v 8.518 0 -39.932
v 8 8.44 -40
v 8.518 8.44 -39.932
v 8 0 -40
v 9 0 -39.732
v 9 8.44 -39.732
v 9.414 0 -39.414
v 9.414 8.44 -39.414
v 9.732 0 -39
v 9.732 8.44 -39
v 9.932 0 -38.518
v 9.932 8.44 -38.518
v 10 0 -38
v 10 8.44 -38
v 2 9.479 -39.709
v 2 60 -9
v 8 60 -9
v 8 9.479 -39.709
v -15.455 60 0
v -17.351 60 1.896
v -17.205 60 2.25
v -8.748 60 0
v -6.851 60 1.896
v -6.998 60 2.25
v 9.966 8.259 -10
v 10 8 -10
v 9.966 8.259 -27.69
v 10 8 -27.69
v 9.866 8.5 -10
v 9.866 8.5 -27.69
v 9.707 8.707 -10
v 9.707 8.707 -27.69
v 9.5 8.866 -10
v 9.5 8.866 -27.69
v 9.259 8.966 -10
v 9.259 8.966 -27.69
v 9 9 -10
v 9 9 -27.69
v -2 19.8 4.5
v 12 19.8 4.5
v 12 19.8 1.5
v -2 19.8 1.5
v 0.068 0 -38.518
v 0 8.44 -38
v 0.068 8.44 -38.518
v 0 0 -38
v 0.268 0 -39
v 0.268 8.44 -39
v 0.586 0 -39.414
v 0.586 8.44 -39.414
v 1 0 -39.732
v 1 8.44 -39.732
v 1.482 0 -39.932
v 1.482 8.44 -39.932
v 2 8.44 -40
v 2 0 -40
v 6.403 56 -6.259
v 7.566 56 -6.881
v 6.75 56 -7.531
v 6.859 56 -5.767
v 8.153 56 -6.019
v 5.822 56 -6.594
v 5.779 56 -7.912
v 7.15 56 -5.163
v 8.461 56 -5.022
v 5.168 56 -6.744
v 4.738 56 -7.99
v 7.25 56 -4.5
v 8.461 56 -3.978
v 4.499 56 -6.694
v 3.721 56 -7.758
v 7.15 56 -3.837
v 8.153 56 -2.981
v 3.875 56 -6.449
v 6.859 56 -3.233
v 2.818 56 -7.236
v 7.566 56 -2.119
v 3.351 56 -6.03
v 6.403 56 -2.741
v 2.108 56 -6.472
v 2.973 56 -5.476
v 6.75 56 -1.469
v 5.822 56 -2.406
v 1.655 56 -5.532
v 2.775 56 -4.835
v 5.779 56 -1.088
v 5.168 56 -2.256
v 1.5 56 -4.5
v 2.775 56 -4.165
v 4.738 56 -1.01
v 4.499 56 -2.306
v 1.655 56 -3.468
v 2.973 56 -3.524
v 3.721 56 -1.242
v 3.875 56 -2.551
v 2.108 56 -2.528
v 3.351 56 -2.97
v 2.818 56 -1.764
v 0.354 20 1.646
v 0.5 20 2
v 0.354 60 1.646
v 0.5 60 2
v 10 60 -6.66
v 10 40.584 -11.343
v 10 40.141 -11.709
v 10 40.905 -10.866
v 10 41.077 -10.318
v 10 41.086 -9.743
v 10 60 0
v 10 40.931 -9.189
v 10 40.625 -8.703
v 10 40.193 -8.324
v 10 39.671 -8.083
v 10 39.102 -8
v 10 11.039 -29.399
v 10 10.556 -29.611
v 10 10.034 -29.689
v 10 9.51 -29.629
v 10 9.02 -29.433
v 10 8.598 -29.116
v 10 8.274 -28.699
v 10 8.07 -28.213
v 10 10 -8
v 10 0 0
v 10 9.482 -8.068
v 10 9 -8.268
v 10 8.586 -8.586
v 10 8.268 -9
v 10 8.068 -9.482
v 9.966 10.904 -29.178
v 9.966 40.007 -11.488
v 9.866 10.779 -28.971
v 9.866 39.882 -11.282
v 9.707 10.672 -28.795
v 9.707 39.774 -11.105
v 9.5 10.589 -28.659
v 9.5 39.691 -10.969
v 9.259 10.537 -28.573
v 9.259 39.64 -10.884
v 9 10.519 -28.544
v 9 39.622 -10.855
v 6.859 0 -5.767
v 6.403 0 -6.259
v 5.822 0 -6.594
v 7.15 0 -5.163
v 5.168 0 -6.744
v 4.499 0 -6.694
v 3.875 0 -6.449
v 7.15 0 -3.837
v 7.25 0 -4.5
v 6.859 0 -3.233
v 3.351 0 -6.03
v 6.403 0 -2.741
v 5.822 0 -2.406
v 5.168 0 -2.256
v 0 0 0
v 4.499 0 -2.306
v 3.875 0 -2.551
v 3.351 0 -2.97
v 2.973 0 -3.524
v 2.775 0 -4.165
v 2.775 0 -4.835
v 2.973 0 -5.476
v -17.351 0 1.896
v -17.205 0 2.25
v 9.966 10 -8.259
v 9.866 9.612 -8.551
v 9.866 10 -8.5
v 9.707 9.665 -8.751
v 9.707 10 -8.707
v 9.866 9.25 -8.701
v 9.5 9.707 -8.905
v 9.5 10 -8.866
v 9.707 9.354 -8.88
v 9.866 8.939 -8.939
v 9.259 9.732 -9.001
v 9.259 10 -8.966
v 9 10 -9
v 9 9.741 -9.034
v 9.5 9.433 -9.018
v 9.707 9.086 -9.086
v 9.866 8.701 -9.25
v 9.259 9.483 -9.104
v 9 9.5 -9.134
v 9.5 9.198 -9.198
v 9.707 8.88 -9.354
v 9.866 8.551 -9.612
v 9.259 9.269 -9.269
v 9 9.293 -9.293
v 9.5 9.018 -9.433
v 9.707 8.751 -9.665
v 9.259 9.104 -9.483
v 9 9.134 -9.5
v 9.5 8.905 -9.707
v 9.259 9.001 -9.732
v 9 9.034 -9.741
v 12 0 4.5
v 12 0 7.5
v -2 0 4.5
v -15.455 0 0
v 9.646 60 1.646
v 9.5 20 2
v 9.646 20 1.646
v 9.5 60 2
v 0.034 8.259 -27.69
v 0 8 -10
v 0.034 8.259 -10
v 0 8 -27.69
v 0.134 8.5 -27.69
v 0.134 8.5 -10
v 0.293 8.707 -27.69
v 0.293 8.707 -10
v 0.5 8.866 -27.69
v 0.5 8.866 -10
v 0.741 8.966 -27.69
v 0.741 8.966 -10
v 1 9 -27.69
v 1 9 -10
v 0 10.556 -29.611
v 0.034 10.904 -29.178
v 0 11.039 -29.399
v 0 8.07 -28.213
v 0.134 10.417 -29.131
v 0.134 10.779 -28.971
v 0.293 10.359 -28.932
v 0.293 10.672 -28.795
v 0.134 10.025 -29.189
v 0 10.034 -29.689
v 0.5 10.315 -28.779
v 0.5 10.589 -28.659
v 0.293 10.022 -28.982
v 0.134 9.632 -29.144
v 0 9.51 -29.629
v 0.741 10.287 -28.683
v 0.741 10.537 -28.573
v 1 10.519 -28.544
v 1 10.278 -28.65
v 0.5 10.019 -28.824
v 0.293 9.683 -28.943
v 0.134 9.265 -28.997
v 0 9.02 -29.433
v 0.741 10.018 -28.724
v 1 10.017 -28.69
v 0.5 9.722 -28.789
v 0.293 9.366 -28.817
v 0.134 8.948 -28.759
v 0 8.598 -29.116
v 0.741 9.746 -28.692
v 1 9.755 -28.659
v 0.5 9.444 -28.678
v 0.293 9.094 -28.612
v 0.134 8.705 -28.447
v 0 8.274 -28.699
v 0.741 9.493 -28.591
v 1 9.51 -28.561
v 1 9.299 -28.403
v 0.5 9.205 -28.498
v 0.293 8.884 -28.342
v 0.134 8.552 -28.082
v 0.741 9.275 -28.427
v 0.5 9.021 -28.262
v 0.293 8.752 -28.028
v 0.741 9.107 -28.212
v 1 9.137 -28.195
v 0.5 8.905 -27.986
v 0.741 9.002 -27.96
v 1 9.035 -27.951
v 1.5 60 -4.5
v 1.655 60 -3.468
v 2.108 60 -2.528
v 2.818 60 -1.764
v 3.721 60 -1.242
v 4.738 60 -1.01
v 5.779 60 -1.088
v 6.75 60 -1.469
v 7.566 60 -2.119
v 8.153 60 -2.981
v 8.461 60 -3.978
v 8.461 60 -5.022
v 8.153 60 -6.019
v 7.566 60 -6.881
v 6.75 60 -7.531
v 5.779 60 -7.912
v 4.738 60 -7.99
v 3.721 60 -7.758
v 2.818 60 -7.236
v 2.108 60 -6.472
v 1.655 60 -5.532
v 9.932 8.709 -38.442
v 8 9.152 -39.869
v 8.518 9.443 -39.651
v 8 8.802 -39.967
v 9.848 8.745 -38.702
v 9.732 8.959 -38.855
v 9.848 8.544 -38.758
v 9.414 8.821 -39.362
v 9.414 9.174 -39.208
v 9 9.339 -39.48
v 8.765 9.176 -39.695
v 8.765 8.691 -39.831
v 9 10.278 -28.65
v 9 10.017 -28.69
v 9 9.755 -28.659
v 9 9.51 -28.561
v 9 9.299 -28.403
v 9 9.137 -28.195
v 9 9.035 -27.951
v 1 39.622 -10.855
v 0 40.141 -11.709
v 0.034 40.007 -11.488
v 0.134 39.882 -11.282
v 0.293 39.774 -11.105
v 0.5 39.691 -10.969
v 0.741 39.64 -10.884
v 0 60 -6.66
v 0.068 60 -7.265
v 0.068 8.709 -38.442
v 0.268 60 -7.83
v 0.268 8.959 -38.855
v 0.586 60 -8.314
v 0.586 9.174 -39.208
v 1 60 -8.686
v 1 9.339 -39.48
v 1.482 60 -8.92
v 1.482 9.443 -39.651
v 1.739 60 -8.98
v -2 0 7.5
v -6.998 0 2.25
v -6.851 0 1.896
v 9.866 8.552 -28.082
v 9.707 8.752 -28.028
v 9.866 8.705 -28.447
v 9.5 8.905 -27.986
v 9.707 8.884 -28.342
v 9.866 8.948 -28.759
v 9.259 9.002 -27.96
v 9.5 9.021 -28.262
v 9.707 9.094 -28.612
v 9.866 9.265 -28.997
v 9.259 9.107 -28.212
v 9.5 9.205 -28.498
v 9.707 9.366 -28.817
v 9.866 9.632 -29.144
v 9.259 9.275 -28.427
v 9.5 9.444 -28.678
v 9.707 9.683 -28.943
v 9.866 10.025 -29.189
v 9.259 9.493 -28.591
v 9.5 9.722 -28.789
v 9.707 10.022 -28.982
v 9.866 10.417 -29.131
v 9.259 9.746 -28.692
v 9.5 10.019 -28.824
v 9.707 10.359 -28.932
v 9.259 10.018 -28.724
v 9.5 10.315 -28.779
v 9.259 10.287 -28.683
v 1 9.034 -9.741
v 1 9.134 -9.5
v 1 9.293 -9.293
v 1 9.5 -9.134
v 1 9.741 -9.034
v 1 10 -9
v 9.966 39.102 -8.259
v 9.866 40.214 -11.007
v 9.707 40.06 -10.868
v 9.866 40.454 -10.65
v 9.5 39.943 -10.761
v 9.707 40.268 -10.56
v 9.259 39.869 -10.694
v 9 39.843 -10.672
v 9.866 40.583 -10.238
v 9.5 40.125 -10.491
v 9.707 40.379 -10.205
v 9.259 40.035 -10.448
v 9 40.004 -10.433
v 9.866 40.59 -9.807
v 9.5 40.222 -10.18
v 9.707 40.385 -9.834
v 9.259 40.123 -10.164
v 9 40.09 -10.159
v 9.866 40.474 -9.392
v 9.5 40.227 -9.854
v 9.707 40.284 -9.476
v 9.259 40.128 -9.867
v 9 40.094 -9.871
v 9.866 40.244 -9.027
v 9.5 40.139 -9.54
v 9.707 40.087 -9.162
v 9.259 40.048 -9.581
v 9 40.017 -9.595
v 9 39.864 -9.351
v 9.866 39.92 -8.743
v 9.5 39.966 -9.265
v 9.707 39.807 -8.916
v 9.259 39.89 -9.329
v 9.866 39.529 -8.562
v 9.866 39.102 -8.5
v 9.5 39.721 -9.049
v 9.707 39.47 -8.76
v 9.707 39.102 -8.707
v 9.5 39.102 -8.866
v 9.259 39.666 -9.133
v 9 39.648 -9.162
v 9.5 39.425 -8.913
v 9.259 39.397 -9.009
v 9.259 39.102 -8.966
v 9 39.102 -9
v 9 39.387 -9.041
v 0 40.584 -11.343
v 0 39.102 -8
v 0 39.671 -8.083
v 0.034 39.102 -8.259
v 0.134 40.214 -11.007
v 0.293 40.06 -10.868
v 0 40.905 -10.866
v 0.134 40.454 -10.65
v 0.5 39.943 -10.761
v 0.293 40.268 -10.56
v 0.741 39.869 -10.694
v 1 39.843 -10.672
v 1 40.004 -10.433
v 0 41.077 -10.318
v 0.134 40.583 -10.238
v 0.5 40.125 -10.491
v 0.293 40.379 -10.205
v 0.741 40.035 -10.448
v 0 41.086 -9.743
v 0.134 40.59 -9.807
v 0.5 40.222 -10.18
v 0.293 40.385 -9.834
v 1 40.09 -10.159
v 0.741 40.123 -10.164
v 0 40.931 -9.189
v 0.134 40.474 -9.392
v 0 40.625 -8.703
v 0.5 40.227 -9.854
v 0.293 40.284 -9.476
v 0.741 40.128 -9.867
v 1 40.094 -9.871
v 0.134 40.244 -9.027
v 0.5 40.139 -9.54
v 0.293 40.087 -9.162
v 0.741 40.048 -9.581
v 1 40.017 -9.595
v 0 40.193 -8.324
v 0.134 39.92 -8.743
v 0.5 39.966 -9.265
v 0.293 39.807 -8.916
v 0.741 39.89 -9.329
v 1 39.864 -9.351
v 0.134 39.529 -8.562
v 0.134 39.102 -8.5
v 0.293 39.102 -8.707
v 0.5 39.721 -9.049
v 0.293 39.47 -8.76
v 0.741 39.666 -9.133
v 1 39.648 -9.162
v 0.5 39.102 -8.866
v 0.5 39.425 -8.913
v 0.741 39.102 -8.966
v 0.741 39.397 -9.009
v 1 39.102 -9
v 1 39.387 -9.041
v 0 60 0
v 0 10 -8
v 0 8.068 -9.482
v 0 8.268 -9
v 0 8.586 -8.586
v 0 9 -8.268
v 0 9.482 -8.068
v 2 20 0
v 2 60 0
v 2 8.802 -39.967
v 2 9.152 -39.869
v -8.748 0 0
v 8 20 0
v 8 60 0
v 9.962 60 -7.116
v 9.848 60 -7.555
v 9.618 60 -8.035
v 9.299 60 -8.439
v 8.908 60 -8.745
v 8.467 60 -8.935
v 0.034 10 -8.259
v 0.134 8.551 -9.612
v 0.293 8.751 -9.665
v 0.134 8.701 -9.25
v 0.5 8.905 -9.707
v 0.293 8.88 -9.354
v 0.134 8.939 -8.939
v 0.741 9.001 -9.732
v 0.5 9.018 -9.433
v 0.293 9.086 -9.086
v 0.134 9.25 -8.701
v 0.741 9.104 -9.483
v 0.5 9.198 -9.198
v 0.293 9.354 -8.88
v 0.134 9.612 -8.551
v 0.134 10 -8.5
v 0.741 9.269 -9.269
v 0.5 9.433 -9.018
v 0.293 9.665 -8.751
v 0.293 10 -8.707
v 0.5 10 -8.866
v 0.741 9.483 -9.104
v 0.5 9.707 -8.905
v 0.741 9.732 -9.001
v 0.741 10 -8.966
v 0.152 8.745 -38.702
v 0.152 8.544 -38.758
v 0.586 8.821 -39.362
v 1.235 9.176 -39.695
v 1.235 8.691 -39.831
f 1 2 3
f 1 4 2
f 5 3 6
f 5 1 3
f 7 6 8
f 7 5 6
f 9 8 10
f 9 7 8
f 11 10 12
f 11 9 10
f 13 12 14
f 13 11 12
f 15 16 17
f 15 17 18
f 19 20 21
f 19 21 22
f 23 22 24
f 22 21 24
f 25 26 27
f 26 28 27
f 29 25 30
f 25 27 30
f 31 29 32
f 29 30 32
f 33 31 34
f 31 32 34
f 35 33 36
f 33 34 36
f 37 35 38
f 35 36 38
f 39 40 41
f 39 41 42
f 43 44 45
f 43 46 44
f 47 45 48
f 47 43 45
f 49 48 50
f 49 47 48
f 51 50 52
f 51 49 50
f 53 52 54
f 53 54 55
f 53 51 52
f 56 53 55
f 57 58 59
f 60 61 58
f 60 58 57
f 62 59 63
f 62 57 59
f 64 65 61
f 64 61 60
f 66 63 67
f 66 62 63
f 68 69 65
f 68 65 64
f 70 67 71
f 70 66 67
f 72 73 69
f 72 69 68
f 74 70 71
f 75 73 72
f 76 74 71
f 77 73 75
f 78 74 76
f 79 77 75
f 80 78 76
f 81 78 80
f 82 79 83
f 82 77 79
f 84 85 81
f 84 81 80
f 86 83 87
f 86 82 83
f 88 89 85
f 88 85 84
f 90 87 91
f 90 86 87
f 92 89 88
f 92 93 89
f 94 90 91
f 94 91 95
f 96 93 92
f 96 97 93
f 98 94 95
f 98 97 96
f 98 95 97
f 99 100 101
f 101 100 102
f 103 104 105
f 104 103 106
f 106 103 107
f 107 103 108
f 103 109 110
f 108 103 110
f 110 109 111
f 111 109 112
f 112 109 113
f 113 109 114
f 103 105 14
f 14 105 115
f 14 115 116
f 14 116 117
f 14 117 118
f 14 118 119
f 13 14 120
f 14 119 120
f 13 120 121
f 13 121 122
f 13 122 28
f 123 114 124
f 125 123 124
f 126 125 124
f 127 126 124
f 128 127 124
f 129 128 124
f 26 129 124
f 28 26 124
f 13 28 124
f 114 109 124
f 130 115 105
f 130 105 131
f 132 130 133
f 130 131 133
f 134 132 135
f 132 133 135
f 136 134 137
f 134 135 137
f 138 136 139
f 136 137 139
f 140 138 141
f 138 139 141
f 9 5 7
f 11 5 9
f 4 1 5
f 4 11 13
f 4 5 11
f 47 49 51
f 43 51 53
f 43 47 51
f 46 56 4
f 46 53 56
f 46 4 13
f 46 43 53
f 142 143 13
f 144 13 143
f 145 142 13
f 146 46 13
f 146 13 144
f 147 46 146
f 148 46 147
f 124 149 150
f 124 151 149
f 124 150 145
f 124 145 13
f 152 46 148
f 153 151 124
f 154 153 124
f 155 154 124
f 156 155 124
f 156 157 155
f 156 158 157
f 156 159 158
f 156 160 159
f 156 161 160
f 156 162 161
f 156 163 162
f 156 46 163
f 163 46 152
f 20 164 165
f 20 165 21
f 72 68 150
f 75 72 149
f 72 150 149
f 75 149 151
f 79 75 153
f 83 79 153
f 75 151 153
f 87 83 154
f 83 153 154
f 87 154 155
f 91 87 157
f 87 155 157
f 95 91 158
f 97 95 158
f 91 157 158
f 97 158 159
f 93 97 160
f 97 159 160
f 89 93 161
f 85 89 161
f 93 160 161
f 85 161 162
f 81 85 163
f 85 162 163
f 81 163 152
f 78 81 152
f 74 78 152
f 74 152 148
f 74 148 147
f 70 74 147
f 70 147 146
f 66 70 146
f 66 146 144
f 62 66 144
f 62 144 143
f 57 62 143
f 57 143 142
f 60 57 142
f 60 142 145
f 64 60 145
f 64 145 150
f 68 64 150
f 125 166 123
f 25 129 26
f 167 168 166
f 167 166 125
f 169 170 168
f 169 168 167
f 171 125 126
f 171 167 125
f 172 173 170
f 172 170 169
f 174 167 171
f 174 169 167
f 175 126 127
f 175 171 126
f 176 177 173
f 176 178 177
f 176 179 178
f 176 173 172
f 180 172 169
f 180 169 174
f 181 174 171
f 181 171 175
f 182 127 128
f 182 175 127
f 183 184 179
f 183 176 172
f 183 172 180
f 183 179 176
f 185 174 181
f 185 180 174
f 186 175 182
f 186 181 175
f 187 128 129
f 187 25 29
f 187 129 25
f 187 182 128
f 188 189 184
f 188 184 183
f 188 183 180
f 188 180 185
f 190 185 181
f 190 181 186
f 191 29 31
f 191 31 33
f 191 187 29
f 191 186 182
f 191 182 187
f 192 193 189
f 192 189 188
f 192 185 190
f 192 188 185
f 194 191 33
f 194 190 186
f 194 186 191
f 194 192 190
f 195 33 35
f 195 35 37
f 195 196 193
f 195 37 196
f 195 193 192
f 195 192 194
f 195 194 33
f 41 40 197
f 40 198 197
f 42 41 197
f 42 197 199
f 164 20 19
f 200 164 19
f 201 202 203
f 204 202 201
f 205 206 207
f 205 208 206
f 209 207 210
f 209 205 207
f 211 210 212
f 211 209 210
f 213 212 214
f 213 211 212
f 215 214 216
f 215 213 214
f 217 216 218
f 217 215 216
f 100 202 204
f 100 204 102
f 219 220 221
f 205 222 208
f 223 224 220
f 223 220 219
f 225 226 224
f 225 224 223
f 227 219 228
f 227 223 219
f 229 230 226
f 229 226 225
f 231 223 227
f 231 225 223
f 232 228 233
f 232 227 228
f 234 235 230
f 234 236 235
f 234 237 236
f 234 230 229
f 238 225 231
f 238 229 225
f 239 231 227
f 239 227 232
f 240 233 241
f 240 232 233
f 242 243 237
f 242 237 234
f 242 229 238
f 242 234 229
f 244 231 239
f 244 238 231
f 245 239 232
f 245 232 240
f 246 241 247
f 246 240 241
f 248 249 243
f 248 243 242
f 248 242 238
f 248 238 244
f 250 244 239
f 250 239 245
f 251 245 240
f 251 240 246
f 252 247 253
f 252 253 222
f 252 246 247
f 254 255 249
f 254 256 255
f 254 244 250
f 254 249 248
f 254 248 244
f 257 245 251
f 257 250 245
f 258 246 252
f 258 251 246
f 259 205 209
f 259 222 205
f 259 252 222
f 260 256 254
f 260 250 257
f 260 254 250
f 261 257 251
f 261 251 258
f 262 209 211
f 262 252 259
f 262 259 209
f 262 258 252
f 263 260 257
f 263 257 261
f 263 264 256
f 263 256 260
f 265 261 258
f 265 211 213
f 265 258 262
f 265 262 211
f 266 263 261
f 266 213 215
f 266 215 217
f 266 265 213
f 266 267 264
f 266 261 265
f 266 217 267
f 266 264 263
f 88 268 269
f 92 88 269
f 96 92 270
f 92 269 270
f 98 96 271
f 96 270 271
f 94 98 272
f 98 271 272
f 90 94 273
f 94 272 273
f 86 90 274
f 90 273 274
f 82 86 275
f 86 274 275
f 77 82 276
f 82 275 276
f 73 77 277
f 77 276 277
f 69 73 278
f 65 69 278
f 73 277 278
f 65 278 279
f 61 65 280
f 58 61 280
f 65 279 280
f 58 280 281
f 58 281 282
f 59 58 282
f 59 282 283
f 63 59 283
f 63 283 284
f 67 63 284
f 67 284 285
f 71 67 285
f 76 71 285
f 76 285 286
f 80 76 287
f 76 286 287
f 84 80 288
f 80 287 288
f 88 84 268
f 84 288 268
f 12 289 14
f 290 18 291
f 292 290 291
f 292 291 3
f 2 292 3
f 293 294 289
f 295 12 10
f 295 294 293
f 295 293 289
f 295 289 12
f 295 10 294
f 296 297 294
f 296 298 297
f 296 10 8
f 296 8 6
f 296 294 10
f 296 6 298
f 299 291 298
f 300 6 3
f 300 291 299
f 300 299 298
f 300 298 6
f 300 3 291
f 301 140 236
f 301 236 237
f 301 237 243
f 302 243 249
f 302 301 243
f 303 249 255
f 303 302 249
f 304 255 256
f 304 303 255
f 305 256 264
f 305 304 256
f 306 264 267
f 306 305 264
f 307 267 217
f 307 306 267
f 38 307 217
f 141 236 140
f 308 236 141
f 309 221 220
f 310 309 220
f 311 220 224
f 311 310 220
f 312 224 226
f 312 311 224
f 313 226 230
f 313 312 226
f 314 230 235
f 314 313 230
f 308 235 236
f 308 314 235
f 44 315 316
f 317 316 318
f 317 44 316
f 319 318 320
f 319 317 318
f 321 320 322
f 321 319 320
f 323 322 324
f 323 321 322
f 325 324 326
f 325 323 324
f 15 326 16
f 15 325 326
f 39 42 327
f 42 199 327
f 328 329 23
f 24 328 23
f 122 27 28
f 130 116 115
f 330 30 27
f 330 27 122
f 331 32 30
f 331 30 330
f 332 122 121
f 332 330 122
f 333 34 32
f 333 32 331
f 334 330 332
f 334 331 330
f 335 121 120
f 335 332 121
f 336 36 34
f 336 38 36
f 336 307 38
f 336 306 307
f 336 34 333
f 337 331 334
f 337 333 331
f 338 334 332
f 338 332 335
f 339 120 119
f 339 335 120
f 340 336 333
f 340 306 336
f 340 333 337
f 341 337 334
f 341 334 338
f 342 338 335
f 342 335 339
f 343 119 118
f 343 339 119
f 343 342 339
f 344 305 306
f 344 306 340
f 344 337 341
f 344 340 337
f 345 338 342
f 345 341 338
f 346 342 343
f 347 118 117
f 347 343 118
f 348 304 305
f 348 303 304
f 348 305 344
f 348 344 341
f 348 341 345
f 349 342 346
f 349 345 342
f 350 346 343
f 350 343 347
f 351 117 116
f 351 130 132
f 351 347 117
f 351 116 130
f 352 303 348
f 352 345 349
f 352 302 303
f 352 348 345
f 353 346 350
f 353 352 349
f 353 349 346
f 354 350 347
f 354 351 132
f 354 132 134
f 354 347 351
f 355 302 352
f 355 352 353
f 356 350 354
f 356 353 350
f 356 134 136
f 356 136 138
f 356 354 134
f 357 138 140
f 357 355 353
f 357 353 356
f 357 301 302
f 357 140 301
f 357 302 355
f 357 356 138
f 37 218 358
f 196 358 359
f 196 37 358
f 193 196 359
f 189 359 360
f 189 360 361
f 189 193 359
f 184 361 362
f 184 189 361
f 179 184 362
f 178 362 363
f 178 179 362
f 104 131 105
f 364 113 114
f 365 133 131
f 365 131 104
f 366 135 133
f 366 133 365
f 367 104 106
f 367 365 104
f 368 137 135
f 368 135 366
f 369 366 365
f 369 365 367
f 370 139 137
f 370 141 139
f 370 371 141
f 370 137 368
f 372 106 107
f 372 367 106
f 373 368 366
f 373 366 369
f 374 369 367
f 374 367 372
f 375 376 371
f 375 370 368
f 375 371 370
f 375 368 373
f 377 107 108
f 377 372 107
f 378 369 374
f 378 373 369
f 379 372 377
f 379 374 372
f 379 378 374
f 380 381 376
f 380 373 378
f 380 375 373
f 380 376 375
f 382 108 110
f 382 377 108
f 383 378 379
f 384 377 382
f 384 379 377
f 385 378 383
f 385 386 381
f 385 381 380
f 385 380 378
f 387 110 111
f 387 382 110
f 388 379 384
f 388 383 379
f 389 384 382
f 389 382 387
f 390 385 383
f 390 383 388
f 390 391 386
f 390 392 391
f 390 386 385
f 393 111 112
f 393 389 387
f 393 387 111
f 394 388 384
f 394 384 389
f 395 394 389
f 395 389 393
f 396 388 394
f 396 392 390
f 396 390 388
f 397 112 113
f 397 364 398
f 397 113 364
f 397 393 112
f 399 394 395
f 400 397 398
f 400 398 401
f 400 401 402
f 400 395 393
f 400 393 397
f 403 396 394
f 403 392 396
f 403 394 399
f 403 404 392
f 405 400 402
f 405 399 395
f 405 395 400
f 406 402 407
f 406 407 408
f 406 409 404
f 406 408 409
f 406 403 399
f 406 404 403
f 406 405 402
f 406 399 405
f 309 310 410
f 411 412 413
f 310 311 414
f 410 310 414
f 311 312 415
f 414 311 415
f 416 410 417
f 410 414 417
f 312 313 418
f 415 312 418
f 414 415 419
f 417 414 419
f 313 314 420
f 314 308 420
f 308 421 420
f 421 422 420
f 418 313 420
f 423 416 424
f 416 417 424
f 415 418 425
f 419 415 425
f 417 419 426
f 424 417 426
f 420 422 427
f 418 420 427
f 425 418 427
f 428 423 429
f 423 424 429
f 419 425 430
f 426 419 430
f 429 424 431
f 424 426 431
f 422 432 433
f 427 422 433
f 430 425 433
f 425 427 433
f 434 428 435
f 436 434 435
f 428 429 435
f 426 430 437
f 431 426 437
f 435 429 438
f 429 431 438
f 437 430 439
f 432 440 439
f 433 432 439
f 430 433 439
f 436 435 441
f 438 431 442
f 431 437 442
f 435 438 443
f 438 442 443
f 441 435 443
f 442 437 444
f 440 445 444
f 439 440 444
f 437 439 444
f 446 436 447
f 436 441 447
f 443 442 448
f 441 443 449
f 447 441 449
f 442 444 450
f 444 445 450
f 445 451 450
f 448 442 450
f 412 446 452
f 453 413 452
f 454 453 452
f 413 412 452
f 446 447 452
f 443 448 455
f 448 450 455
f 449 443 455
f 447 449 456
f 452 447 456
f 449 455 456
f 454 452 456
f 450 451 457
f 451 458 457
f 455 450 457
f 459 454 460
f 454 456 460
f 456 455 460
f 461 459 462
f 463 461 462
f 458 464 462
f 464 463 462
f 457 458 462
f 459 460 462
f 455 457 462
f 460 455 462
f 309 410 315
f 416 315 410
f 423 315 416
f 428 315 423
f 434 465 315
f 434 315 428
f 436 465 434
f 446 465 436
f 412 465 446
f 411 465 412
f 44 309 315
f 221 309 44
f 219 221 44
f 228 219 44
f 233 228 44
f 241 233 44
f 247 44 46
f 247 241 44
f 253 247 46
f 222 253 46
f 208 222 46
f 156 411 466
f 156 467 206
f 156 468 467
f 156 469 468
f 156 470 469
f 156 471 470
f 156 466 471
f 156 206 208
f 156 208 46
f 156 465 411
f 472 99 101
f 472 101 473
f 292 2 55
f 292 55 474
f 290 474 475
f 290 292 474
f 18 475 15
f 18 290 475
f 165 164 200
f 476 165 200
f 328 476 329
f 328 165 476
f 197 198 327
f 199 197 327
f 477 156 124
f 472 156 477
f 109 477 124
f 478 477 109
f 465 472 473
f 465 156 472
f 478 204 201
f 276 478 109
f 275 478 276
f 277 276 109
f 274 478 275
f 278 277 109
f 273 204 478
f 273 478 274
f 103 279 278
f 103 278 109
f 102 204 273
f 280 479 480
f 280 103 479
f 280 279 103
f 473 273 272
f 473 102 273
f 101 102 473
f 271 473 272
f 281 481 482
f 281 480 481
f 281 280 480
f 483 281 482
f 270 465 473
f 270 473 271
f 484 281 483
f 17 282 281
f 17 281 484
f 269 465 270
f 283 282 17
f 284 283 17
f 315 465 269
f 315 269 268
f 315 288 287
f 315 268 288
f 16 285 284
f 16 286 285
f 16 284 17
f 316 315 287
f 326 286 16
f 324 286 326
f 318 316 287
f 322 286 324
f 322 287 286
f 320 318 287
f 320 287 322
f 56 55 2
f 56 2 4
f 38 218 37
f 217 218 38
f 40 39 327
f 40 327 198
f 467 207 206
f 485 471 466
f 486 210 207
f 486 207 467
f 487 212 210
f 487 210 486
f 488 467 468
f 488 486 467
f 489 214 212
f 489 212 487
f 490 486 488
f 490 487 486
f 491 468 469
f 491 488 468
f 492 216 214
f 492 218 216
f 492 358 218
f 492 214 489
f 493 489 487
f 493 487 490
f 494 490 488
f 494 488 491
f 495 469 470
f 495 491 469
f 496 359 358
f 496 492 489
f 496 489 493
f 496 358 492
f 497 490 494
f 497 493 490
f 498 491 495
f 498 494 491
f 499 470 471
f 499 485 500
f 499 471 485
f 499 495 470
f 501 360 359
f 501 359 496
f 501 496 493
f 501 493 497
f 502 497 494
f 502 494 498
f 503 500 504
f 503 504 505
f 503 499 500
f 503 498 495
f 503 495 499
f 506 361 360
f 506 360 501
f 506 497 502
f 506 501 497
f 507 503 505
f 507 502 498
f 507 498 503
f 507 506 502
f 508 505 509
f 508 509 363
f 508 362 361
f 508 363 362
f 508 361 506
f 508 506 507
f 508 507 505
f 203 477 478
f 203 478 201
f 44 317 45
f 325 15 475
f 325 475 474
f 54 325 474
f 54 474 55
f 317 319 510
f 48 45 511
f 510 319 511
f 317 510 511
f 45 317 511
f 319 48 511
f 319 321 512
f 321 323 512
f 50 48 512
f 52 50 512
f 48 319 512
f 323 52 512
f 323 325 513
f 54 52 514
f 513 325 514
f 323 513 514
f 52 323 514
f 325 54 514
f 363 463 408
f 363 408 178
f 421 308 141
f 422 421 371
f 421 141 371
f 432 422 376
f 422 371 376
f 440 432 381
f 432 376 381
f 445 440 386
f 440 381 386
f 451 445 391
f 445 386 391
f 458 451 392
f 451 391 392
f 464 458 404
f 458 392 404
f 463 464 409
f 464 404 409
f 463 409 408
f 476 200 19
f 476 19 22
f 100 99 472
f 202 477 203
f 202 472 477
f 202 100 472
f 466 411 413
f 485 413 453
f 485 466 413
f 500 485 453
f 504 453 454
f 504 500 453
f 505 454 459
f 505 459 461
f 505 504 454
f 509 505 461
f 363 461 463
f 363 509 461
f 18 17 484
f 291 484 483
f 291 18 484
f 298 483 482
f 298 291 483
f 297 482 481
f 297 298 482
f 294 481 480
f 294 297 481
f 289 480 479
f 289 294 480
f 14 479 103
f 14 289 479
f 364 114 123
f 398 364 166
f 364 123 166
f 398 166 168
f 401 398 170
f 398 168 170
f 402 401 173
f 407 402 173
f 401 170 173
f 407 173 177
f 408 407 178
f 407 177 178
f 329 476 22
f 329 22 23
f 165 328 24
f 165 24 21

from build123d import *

# Parameters (mm, degrees)
PAD_DEPTH       = 10
SKETCH001_R     = 2.25
POCKET_DEPTH    = 60.001
SKETCH004_R     = 3.5
POCKET002_DEPTH = 4
POCKET001_DEPTH = 10.001
PAD001_DEPTH    = 40
CHAMFER_SIZE    = 0.5
FILLET_R        = 1
FILLET001_R     = 2
SKETCH006_W     = 14
SKETCH006_H     = 3
SKETCH005_W     = 14
SKETCH005_H     = 3
PAD002_DEPTH    = 60
CHAMFER001_SIZE = 0.5


with BuildPart() as mount:
    # Sketch → Pad (new body)
    with BuildSketch(Plane.YZ):
        Polygon((0, 0), (60, 0), (60, -9), (9, -40), (0, -40), align=None)
    extrude(amount=PAD_DEPTH)

    # Sketch001 → Pocket (cut, through all)
    with BuildSketch(Plane.XZ):
        with Locations((5, -4.5)):
            Circle(SKETCH001_R)
    extrude(amount=-POCKET_DEPTH, mode=Mode.SUBTRACT)

    # Sketch004 → Pocket002 (cut)
    with BuildSketch(Plane(origin=(0, 60, 0), x_dir=(-1, 0, 0), z_dir=(0, 1, 0))):
        with Locations((-5, -4.5)):
            Circle(SKETCH004_R)
    extrude(amount=-POCKET002_DEPTH, mode=Mode.SUBTRACT)

    # Sketch002 → Pocket001 (cut, through all)
    with BuildSketch(Plane(origin=(0, 0, 0), x_dir=(0, -1, 0), z_dir=(-1, 0, 0))):
        Polygon((-42.672825, -9), (-9, -9), (-9, -29.467795), align=None)
    extrude(amount=-POCKET001_DEPTH, mode=Mode.SUBTRACT)

    # Sketch003 → Pad001 (join)
    with BuildSketch(Plane(origin=(0, 20, 0), x_dir=(-1, 0, 0), z_dir=(0, 1, 0))):
        Polygon((-8, 0), (-10, 2), (0, 2), (-2, 0), align=None)
    extrude(amount=PAD001_DEPTH)

    # Chamfer
    chamfer_edges = [mount.edges().sort_by_distance(p)[0] for p in [
        (0, 40, 2),
        (10, 40, 2),
    ]]
    chamfer(chamfer_edges, length=CHAMFER_SIZE)

    # Fillet
    fillet_edges = [mount.edges().sort_by_distance(p)[0] for p in [
        (0, 25.836412, -9),
        (5, 9, -9),
        (10, 25.836412, -9),
        (5, 42.672825, -9),
        (0, 9, -19.233898),
        (5, 9, -29.467795),
        (10, 9, -19.233898),
        (0, 25.836412, -19.233898),
        (10, 25.836412, -19.233898),
    ]]
    fillet(fillet_edges, radius=FILLET_R)

    # Fillet001
    fillet001_edges = [mount.edges().sort_by_distance(p)[0] for p in [
        (10, 34.5, -24.5),
        (0, 34.5, -24.5),
        (10, 4.5, -40),
        (0, 4.5, -40),
        (5, 9, -40),
    ]]
    fillet(fillet001_edges, radius=FILLET001_R)


with BuildPart() as dovetail_support:
    # Sketch006 → AdditiveLoft section 0
    with BuildSketch(Plane(origin=(0, 19.8, 0), x_dir=(-1, 0, 0), z_dir=(0, 1, 0))):
        with Locations((-5, 3)):
            Rectangle(SKETCH006_W, SKETCH006_H)
    # Sketch005 → AdditiveLoft section 1
    with BuildSketch(Plane(origin=(0, 0, 0), x_dir=(-1, 0, 0), z_dir=(0, 1, 0))):
        with Locations((-5, 6)):
            Rectangle(SKETCH005_W, SKETCH005_H)
    loft()


with BuildPart() as dovetail_slot_mask:
    # Sketch007 → Pad002 (new body)
    with BuildSketch(Plane(origin=(0, 0, 0), x_dir=(-1, 0, 0), z_dir=(0, 1, 0))):
        Polygon((6.497558, 2.25), (17.704665, 2.25), (15.454665, 0), (8.747558, 0), align=None)
    extrude(amount=PAD002_DEPTH)

    # Chamfer001
    chamfer001_edges = [dovetail_slot_mask.edges().sort_by_distance(p)[0] for p in [
        (-17.704665, 30, 2.25),
        (-6.497558, 30, 2.25),
    ]]
    chamfer(chamfer001_edges, length=CHAMFER001_SIZE)


solid = Compound([mount.part, dovetail_support.part, dovetail_slot_mask.part])
